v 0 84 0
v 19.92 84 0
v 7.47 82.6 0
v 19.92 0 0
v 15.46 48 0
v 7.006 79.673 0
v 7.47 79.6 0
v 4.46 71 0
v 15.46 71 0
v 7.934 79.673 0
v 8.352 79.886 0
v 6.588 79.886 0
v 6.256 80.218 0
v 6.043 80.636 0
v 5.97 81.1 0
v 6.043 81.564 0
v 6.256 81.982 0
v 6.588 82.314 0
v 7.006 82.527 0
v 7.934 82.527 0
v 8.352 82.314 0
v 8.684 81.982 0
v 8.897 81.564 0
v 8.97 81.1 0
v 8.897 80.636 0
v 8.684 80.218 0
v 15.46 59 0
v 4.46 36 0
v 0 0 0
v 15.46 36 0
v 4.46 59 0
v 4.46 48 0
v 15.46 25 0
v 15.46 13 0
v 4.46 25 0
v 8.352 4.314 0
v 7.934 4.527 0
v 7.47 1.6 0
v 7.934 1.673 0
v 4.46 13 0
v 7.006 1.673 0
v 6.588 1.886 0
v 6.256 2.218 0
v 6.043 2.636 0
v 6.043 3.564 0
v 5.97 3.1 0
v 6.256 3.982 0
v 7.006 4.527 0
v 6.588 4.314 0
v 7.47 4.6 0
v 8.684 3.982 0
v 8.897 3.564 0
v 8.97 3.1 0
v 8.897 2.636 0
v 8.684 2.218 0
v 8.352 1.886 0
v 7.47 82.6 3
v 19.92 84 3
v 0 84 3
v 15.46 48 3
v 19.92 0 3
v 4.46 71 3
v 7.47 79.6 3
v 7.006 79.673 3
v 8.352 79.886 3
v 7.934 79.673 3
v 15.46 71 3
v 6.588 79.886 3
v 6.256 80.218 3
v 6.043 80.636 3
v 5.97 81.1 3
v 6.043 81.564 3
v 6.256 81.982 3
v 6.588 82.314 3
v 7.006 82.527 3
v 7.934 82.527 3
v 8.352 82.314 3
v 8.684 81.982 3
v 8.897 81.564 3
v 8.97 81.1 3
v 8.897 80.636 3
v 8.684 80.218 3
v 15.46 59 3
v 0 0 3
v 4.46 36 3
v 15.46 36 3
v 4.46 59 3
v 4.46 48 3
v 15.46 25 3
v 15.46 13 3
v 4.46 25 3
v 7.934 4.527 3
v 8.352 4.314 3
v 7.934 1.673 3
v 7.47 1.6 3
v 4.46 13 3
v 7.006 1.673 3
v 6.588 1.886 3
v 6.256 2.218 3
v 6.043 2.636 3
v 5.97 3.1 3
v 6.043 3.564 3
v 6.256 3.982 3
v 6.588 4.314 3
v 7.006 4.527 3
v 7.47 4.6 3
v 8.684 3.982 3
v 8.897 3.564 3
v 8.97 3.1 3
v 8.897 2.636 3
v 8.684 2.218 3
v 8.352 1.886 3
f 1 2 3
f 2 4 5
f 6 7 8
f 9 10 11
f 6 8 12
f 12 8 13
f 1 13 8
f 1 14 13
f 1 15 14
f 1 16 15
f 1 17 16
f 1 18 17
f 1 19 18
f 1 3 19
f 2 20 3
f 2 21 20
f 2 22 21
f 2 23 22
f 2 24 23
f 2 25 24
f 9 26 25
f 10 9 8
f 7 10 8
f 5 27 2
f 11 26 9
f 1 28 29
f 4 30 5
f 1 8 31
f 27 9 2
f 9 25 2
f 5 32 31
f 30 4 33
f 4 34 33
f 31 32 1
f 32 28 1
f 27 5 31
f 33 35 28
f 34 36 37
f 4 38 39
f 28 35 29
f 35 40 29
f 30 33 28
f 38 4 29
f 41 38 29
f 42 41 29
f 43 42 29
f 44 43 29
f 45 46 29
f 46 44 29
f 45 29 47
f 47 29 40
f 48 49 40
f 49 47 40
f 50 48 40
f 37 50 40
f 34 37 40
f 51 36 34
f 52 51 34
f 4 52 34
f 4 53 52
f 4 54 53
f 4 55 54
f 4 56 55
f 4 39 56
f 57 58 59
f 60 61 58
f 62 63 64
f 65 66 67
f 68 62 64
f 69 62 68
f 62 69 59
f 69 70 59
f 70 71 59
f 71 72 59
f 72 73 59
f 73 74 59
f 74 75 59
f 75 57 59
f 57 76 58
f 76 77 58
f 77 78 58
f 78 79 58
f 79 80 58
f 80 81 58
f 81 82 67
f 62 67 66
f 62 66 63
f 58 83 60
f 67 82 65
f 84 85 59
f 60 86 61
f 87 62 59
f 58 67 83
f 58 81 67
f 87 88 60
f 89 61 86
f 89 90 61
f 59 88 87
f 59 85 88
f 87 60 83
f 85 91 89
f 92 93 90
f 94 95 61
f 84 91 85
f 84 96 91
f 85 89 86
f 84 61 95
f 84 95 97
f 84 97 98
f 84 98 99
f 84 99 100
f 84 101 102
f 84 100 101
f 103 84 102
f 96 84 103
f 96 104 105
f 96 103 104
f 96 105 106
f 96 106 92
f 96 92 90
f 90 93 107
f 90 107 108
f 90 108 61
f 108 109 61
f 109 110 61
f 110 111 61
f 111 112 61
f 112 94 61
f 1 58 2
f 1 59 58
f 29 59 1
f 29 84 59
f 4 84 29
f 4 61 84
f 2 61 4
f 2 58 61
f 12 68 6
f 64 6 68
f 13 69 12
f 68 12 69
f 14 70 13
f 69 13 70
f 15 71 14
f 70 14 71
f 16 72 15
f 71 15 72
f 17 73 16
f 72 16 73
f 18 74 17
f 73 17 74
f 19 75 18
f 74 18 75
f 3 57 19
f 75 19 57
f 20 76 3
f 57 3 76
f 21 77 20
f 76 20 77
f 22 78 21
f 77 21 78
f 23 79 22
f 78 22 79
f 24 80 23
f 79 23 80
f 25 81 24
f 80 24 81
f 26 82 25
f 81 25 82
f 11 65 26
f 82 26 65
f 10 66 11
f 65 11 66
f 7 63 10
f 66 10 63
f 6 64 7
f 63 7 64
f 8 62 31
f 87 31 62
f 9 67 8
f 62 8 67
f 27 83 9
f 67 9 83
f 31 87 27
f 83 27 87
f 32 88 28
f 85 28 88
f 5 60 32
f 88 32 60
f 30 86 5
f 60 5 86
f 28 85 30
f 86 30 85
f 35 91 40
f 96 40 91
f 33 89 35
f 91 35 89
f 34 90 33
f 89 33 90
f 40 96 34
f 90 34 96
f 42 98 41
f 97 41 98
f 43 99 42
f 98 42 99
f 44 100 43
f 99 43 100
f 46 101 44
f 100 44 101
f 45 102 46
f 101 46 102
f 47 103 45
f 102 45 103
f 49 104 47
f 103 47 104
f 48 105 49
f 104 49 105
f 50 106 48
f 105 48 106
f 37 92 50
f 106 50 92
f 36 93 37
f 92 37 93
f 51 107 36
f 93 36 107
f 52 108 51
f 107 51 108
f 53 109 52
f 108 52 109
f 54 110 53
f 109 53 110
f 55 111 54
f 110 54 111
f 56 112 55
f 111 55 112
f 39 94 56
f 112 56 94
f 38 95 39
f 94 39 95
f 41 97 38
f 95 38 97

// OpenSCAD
// file: panel.scad
$fn = 20;
U = 3;
T = 16;

h = U * 44.5 - 5;
w = T * 5.08 - 2*.2;

m_x = 7.47;
//m_x = 0;
m_y = 3.1;
m_d = 3;

F = U * 44.5 + (122.5 - 3 * 44.5);

echo(w);

module hole() {
//    hull() {
    //circle(d=m_d);
    translate([5.08/2,0]) circle(d=m_d);
//    }
}

module holes() {
    translate([m_x, m_y]) hole();
    translate([m_x, m_y + F]) hole();
}

module panel() {
    difference() {
    square([w, h]);
        holes();
        if(T>6) {
            translate([(T-3) * 5.08 - 5.08, 0]) holes();
        }
        translate([(T-24) * 5.08, 0]) holes();
    }
}

//panel();

//#square([46,62]);
//#import("jr-module-bay-cover.stl");
// main file
b_w = 13;
b_h = 20;

include <panel.scad>

T=4;
U = 2;

difference() {
    linear_extrude(3)
    difference() {
    panel();
        
    translate([w/2,h/2])
    intersection() {
        square([11,12],true);
    }
    
        translate([w/2,h/4-2])
    intersection() {
        square([11,12],true);
    }
    
        translate([w/2,3*h/4+2])
    intersection() {
        square([11,12],true);
    }

    }

}
